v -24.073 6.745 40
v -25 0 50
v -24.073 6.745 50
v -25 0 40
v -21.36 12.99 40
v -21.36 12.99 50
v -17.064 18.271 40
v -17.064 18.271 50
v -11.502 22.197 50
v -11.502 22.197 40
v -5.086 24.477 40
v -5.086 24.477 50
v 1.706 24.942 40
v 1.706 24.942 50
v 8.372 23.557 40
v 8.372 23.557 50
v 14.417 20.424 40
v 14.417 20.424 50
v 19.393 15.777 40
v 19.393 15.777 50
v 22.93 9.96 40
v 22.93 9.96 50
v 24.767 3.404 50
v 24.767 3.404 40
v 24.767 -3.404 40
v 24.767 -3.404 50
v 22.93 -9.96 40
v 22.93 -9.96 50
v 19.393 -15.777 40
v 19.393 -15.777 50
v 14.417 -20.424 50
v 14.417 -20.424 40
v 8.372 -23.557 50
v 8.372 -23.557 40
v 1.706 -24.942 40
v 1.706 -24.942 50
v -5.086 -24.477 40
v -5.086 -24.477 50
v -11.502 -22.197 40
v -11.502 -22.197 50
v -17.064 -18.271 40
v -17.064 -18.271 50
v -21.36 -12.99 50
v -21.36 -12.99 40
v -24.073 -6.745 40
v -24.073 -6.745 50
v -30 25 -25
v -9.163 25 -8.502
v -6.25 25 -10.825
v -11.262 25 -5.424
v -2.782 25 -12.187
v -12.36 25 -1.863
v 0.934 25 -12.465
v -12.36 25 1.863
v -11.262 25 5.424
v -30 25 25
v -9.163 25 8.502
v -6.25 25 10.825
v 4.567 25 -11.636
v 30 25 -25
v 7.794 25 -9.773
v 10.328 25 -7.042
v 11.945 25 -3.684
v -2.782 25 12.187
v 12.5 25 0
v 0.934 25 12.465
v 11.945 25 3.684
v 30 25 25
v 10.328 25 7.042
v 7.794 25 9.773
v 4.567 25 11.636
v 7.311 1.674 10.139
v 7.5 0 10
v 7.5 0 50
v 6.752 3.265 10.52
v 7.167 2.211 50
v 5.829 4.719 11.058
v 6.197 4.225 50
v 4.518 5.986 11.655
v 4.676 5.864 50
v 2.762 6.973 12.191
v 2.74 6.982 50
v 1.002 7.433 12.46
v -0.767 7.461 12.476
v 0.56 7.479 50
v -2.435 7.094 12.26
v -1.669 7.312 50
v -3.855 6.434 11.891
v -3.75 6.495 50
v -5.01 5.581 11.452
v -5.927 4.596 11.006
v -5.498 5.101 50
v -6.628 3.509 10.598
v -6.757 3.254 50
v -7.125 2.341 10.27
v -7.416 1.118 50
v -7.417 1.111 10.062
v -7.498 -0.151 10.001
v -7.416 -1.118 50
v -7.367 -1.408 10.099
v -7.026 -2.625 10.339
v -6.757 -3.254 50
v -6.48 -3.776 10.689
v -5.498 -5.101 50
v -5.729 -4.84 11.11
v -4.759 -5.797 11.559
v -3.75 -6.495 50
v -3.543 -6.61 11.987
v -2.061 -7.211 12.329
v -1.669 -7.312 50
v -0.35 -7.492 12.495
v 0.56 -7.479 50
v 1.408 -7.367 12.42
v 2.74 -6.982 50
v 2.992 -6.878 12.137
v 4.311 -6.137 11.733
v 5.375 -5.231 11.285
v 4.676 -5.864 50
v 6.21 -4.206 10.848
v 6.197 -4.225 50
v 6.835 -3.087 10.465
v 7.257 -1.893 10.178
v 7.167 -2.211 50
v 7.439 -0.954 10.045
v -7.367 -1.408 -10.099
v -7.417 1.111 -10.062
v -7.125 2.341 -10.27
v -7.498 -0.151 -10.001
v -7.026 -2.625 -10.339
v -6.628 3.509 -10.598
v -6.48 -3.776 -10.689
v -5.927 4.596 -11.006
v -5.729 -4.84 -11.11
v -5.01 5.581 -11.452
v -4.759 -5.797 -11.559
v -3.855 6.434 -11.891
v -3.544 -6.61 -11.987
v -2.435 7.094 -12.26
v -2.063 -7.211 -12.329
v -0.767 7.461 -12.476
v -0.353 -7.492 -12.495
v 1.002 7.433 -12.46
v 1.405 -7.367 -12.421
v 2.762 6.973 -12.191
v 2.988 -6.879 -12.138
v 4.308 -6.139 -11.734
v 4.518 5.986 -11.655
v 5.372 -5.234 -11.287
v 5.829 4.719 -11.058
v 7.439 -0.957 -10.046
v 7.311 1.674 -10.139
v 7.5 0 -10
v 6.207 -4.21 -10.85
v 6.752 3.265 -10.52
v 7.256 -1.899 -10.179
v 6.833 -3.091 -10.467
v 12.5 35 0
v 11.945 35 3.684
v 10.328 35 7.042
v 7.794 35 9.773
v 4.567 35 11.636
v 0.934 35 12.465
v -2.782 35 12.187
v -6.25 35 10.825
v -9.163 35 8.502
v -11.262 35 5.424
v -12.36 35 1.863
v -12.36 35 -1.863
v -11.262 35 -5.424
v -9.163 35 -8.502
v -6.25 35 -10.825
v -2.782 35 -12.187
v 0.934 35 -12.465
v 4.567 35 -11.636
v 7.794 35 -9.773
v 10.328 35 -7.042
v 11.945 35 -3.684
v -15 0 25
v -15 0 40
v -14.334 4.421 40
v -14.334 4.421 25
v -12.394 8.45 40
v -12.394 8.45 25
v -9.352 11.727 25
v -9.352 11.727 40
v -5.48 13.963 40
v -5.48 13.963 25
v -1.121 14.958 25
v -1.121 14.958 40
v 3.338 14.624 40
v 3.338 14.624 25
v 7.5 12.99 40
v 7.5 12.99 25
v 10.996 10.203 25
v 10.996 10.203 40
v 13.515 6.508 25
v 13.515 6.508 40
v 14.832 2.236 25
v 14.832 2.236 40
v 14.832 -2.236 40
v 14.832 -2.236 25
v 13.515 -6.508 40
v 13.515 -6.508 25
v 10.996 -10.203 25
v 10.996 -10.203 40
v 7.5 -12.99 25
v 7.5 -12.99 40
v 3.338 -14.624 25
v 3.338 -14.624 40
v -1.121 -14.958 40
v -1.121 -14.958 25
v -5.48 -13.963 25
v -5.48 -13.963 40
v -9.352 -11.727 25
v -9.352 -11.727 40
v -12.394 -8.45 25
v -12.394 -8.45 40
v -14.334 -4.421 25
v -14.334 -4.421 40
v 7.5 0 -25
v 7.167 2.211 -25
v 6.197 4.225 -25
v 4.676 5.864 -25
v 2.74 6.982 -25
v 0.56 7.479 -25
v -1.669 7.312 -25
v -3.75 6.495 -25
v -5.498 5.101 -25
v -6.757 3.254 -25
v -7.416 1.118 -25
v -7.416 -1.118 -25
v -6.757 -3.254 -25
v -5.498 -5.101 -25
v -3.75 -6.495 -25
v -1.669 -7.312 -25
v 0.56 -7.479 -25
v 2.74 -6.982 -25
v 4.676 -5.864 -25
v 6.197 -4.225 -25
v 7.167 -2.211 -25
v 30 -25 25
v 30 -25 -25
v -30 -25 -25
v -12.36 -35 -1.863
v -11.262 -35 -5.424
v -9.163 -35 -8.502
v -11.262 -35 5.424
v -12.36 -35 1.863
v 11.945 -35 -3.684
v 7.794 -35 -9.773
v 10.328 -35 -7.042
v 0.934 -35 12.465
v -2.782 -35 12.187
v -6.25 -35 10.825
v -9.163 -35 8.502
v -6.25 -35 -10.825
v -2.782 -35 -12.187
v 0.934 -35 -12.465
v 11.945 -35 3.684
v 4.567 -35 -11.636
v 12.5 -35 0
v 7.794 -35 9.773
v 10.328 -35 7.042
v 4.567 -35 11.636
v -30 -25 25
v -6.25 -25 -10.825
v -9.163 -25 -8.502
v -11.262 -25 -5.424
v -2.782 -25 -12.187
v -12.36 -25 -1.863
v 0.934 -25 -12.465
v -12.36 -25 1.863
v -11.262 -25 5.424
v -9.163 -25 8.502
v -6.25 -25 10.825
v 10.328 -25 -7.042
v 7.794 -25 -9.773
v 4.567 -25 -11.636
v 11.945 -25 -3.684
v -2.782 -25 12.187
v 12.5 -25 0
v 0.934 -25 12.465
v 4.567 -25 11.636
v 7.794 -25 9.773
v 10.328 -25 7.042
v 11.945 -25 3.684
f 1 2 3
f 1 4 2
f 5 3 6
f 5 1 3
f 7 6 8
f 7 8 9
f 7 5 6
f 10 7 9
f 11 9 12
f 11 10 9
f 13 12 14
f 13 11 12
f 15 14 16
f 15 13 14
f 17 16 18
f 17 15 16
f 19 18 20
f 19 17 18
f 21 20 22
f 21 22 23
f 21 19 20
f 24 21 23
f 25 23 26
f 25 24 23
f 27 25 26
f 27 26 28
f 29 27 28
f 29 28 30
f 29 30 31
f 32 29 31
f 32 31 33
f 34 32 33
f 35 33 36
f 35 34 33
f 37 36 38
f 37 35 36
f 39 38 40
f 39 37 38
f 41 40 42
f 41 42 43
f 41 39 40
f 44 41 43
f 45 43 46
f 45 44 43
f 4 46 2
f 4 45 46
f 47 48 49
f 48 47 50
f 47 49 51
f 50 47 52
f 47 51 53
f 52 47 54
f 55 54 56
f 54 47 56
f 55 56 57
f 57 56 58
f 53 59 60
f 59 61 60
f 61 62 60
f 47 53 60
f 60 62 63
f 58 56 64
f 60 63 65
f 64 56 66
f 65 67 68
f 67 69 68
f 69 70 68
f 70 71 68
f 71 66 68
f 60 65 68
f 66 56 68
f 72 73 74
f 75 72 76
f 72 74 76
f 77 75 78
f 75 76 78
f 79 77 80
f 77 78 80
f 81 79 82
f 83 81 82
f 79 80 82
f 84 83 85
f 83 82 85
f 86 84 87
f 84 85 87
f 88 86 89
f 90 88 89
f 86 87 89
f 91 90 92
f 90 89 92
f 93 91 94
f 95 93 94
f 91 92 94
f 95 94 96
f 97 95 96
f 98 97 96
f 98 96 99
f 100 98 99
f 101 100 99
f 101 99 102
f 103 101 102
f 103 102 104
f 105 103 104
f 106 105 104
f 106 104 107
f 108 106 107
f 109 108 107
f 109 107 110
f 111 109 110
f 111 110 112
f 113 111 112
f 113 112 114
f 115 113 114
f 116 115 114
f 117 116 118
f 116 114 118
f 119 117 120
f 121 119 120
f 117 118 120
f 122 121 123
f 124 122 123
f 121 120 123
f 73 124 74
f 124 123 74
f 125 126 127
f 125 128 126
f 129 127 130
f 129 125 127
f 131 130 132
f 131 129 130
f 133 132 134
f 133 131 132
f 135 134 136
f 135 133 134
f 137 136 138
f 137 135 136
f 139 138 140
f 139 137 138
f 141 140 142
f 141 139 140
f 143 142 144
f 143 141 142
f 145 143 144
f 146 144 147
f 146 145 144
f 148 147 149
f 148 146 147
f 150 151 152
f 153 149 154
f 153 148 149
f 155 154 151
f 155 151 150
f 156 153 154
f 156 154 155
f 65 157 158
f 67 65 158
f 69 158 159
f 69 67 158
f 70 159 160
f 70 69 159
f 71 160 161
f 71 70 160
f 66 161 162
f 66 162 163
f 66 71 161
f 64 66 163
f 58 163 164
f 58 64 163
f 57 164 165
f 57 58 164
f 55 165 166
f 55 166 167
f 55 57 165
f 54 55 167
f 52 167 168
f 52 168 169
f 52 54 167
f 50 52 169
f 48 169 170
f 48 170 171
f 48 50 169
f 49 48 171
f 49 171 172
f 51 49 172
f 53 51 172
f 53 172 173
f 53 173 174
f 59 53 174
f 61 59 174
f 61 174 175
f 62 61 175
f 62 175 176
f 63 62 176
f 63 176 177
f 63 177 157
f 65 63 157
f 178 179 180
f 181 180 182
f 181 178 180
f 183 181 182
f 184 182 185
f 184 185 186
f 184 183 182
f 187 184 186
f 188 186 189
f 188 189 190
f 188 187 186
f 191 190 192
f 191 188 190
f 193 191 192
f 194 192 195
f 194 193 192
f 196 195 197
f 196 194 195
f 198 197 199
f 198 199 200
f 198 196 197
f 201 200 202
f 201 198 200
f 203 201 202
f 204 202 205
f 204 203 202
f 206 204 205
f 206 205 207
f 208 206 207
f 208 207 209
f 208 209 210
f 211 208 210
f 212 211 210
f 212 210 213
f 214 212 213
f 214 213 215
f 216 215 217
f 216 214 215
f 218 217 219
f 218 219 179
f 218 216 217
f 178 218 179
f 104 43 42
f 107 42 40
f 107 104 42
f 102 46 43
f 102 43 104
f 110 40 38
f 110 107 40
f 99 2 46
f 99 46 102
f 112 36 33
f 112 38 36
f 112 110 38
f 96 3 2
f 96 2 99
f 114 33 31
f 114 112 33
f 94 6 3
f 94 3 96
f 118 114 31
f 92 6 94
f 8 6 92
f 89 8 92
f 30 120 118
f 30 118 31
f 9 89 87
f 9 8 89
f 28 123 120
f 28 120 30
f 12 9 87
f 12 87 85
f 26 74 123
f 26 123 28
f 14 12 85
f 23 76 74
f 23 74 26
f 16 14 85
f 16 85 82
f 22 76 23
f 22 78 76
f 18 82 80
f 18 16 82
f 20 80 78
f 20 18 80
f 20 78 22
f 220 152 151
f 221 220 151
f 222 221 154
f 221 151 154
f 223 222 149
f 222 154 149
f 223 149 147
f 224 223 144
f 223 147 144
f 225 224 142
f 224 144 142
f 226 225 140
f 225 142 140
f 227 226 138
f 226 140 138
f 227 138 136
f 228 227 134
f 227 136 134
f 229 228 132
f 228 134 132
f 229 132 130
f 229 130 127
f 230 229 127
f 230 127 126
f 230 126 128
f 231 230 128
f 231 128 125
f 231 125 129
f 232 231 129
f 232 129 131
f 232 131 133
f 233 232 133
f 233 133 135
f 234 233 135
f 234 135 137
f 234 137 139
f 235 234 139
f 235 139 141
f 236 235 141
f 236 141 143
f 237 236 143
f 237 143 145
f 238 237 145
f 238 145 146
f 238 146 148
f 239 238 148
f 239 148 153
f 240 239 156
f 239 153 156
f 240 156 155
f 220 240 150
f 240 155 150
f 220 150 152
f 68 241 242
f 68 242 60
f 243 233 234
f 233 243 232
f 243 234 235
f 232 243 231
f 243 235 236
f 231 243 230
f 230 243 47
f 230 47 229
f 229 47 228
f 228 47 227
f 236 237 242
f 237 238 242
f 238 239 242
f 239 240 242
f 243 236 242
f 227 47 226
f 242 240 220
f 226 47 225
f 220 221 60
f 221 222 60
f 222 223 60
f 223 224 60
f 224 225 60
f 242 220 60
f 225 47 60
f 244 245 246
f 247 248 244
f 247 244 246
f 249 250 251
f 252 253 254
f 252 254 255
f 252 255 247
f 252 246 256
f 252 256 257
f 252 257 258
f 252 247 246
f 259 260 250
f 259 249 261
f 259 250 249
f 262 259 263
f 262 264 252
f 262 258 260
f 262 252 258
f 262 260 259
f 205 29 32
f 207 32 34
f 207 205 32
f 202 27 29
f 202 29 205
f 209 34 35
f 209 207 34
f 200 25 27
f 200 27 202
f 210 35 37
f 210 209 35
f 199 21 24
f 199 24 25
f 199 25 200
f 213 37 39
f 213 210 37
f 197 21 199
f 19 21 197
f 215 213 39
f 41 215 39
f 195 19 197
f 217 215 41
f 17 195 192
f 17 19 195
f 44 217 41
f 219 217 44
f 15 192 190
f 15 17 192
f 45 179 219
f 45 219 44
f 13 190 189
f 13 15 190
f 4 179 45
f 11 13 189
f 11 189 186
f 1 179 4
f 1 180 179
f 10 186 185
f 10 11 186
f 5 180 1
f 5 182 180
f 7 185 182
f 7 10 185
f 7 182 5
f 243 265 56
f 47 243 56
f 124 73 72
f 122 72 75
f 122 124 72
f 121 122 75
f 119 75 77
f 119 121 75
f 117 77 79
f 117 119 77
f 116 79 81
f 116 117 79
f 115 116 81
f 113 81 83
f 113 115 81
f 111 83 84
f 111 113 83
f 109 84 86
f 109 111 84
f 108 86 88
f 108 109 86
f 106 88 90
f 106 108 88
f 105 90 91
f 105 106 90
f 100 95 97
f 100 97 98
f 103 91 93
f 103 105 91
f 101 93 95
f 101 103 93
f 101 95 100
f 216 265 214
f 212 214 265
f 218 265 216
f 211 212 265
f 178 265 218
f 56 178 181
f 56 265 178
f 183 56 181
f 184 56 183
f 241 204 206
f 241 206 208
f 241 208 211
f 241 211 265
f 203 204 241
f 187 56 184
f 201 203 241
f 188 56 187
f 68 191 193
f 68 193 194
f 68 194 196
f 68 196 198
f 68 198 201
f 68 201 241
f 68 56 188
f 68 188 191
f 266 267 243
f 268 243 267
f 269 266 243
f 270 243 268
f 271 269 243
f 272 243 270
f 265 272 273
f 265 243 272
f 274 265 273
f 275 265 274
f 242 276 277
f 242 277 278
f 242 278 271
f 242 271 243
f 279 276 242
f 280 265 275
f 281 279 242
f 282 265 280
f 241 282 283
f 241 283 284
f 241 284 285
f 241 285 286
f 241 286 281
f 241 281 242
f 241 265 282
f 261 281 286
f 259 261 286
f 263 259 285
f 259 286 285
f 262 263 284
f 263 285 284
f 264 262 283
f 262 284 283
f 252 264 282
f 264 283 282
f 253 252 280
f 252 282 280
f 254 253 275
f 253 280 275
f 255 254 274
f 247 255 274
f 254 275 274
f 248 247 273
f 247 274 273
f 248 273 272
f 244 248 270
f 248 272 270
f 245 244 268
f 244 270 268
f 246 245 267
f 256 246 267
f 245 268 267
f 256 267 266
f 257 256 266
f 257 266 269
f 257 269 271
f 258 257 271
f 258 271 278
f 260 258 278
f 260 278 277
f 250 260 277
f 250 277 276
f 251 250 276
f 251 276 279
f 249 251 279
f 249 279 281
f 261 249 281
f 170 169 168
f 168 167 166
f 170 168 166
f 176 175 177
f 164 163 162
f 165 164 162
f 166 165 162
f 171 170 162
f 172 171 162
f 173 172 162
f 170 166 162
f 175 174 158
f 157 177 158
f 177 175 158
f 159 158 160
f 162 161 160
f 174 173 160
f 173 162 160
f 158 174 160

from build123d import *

# Parameters (mm, degrees)
F0_W          = 60
F0_H          = 50
F1_DEPTH      = 25
F1_DEPTH_BACK = 25
F4_R          = 7.5
F5_DEPTH      = 75.001
F6_R          = 12.5
F7_DEPTH      = 35
F7_DEPTH_BACK = 35


with BuildPart() as f1:
    # F0 (on Top) → F1 (new body, two sides)
    with BuildSketch(Plane.XY) as f1_sk:
        Rectangle(F0_W, F0_H)
    extrude(amount=F1_DEPTH)
    extrude(f1_sk.sketch, amount=-F1_DEPTH_BACK)

    # F2 (on Front) → F3 (revolve)
    with BuildSketch(Plane.XZ):
        Polygon((-15, 40), (-15, 25), (0, 25), (0, 50), (-25, 50), (-25, 40), align=None)
    revolve(axis=Axis((0, 0, 37.5), (0, 0, -1)))

    # F4 (on face) → F5 (cut, through all)
    with BuildSketch(Plane.XY.offset(50)):
        Circle(F4_R)
    extrude(amount=-F5_DEPTH, mode=Mode.SUBTRACT)

    # F6 (on Front) → F7 (join, two sides)
    with BuildSketch(Plane.XZ) as f7_sk:
        Circle(F6_R)
    extrude(amount=F7_DEPTH)
    extrude(f7_sk.sketch, amount=-F7_DEPTH_BACK)


solid = f1.part
